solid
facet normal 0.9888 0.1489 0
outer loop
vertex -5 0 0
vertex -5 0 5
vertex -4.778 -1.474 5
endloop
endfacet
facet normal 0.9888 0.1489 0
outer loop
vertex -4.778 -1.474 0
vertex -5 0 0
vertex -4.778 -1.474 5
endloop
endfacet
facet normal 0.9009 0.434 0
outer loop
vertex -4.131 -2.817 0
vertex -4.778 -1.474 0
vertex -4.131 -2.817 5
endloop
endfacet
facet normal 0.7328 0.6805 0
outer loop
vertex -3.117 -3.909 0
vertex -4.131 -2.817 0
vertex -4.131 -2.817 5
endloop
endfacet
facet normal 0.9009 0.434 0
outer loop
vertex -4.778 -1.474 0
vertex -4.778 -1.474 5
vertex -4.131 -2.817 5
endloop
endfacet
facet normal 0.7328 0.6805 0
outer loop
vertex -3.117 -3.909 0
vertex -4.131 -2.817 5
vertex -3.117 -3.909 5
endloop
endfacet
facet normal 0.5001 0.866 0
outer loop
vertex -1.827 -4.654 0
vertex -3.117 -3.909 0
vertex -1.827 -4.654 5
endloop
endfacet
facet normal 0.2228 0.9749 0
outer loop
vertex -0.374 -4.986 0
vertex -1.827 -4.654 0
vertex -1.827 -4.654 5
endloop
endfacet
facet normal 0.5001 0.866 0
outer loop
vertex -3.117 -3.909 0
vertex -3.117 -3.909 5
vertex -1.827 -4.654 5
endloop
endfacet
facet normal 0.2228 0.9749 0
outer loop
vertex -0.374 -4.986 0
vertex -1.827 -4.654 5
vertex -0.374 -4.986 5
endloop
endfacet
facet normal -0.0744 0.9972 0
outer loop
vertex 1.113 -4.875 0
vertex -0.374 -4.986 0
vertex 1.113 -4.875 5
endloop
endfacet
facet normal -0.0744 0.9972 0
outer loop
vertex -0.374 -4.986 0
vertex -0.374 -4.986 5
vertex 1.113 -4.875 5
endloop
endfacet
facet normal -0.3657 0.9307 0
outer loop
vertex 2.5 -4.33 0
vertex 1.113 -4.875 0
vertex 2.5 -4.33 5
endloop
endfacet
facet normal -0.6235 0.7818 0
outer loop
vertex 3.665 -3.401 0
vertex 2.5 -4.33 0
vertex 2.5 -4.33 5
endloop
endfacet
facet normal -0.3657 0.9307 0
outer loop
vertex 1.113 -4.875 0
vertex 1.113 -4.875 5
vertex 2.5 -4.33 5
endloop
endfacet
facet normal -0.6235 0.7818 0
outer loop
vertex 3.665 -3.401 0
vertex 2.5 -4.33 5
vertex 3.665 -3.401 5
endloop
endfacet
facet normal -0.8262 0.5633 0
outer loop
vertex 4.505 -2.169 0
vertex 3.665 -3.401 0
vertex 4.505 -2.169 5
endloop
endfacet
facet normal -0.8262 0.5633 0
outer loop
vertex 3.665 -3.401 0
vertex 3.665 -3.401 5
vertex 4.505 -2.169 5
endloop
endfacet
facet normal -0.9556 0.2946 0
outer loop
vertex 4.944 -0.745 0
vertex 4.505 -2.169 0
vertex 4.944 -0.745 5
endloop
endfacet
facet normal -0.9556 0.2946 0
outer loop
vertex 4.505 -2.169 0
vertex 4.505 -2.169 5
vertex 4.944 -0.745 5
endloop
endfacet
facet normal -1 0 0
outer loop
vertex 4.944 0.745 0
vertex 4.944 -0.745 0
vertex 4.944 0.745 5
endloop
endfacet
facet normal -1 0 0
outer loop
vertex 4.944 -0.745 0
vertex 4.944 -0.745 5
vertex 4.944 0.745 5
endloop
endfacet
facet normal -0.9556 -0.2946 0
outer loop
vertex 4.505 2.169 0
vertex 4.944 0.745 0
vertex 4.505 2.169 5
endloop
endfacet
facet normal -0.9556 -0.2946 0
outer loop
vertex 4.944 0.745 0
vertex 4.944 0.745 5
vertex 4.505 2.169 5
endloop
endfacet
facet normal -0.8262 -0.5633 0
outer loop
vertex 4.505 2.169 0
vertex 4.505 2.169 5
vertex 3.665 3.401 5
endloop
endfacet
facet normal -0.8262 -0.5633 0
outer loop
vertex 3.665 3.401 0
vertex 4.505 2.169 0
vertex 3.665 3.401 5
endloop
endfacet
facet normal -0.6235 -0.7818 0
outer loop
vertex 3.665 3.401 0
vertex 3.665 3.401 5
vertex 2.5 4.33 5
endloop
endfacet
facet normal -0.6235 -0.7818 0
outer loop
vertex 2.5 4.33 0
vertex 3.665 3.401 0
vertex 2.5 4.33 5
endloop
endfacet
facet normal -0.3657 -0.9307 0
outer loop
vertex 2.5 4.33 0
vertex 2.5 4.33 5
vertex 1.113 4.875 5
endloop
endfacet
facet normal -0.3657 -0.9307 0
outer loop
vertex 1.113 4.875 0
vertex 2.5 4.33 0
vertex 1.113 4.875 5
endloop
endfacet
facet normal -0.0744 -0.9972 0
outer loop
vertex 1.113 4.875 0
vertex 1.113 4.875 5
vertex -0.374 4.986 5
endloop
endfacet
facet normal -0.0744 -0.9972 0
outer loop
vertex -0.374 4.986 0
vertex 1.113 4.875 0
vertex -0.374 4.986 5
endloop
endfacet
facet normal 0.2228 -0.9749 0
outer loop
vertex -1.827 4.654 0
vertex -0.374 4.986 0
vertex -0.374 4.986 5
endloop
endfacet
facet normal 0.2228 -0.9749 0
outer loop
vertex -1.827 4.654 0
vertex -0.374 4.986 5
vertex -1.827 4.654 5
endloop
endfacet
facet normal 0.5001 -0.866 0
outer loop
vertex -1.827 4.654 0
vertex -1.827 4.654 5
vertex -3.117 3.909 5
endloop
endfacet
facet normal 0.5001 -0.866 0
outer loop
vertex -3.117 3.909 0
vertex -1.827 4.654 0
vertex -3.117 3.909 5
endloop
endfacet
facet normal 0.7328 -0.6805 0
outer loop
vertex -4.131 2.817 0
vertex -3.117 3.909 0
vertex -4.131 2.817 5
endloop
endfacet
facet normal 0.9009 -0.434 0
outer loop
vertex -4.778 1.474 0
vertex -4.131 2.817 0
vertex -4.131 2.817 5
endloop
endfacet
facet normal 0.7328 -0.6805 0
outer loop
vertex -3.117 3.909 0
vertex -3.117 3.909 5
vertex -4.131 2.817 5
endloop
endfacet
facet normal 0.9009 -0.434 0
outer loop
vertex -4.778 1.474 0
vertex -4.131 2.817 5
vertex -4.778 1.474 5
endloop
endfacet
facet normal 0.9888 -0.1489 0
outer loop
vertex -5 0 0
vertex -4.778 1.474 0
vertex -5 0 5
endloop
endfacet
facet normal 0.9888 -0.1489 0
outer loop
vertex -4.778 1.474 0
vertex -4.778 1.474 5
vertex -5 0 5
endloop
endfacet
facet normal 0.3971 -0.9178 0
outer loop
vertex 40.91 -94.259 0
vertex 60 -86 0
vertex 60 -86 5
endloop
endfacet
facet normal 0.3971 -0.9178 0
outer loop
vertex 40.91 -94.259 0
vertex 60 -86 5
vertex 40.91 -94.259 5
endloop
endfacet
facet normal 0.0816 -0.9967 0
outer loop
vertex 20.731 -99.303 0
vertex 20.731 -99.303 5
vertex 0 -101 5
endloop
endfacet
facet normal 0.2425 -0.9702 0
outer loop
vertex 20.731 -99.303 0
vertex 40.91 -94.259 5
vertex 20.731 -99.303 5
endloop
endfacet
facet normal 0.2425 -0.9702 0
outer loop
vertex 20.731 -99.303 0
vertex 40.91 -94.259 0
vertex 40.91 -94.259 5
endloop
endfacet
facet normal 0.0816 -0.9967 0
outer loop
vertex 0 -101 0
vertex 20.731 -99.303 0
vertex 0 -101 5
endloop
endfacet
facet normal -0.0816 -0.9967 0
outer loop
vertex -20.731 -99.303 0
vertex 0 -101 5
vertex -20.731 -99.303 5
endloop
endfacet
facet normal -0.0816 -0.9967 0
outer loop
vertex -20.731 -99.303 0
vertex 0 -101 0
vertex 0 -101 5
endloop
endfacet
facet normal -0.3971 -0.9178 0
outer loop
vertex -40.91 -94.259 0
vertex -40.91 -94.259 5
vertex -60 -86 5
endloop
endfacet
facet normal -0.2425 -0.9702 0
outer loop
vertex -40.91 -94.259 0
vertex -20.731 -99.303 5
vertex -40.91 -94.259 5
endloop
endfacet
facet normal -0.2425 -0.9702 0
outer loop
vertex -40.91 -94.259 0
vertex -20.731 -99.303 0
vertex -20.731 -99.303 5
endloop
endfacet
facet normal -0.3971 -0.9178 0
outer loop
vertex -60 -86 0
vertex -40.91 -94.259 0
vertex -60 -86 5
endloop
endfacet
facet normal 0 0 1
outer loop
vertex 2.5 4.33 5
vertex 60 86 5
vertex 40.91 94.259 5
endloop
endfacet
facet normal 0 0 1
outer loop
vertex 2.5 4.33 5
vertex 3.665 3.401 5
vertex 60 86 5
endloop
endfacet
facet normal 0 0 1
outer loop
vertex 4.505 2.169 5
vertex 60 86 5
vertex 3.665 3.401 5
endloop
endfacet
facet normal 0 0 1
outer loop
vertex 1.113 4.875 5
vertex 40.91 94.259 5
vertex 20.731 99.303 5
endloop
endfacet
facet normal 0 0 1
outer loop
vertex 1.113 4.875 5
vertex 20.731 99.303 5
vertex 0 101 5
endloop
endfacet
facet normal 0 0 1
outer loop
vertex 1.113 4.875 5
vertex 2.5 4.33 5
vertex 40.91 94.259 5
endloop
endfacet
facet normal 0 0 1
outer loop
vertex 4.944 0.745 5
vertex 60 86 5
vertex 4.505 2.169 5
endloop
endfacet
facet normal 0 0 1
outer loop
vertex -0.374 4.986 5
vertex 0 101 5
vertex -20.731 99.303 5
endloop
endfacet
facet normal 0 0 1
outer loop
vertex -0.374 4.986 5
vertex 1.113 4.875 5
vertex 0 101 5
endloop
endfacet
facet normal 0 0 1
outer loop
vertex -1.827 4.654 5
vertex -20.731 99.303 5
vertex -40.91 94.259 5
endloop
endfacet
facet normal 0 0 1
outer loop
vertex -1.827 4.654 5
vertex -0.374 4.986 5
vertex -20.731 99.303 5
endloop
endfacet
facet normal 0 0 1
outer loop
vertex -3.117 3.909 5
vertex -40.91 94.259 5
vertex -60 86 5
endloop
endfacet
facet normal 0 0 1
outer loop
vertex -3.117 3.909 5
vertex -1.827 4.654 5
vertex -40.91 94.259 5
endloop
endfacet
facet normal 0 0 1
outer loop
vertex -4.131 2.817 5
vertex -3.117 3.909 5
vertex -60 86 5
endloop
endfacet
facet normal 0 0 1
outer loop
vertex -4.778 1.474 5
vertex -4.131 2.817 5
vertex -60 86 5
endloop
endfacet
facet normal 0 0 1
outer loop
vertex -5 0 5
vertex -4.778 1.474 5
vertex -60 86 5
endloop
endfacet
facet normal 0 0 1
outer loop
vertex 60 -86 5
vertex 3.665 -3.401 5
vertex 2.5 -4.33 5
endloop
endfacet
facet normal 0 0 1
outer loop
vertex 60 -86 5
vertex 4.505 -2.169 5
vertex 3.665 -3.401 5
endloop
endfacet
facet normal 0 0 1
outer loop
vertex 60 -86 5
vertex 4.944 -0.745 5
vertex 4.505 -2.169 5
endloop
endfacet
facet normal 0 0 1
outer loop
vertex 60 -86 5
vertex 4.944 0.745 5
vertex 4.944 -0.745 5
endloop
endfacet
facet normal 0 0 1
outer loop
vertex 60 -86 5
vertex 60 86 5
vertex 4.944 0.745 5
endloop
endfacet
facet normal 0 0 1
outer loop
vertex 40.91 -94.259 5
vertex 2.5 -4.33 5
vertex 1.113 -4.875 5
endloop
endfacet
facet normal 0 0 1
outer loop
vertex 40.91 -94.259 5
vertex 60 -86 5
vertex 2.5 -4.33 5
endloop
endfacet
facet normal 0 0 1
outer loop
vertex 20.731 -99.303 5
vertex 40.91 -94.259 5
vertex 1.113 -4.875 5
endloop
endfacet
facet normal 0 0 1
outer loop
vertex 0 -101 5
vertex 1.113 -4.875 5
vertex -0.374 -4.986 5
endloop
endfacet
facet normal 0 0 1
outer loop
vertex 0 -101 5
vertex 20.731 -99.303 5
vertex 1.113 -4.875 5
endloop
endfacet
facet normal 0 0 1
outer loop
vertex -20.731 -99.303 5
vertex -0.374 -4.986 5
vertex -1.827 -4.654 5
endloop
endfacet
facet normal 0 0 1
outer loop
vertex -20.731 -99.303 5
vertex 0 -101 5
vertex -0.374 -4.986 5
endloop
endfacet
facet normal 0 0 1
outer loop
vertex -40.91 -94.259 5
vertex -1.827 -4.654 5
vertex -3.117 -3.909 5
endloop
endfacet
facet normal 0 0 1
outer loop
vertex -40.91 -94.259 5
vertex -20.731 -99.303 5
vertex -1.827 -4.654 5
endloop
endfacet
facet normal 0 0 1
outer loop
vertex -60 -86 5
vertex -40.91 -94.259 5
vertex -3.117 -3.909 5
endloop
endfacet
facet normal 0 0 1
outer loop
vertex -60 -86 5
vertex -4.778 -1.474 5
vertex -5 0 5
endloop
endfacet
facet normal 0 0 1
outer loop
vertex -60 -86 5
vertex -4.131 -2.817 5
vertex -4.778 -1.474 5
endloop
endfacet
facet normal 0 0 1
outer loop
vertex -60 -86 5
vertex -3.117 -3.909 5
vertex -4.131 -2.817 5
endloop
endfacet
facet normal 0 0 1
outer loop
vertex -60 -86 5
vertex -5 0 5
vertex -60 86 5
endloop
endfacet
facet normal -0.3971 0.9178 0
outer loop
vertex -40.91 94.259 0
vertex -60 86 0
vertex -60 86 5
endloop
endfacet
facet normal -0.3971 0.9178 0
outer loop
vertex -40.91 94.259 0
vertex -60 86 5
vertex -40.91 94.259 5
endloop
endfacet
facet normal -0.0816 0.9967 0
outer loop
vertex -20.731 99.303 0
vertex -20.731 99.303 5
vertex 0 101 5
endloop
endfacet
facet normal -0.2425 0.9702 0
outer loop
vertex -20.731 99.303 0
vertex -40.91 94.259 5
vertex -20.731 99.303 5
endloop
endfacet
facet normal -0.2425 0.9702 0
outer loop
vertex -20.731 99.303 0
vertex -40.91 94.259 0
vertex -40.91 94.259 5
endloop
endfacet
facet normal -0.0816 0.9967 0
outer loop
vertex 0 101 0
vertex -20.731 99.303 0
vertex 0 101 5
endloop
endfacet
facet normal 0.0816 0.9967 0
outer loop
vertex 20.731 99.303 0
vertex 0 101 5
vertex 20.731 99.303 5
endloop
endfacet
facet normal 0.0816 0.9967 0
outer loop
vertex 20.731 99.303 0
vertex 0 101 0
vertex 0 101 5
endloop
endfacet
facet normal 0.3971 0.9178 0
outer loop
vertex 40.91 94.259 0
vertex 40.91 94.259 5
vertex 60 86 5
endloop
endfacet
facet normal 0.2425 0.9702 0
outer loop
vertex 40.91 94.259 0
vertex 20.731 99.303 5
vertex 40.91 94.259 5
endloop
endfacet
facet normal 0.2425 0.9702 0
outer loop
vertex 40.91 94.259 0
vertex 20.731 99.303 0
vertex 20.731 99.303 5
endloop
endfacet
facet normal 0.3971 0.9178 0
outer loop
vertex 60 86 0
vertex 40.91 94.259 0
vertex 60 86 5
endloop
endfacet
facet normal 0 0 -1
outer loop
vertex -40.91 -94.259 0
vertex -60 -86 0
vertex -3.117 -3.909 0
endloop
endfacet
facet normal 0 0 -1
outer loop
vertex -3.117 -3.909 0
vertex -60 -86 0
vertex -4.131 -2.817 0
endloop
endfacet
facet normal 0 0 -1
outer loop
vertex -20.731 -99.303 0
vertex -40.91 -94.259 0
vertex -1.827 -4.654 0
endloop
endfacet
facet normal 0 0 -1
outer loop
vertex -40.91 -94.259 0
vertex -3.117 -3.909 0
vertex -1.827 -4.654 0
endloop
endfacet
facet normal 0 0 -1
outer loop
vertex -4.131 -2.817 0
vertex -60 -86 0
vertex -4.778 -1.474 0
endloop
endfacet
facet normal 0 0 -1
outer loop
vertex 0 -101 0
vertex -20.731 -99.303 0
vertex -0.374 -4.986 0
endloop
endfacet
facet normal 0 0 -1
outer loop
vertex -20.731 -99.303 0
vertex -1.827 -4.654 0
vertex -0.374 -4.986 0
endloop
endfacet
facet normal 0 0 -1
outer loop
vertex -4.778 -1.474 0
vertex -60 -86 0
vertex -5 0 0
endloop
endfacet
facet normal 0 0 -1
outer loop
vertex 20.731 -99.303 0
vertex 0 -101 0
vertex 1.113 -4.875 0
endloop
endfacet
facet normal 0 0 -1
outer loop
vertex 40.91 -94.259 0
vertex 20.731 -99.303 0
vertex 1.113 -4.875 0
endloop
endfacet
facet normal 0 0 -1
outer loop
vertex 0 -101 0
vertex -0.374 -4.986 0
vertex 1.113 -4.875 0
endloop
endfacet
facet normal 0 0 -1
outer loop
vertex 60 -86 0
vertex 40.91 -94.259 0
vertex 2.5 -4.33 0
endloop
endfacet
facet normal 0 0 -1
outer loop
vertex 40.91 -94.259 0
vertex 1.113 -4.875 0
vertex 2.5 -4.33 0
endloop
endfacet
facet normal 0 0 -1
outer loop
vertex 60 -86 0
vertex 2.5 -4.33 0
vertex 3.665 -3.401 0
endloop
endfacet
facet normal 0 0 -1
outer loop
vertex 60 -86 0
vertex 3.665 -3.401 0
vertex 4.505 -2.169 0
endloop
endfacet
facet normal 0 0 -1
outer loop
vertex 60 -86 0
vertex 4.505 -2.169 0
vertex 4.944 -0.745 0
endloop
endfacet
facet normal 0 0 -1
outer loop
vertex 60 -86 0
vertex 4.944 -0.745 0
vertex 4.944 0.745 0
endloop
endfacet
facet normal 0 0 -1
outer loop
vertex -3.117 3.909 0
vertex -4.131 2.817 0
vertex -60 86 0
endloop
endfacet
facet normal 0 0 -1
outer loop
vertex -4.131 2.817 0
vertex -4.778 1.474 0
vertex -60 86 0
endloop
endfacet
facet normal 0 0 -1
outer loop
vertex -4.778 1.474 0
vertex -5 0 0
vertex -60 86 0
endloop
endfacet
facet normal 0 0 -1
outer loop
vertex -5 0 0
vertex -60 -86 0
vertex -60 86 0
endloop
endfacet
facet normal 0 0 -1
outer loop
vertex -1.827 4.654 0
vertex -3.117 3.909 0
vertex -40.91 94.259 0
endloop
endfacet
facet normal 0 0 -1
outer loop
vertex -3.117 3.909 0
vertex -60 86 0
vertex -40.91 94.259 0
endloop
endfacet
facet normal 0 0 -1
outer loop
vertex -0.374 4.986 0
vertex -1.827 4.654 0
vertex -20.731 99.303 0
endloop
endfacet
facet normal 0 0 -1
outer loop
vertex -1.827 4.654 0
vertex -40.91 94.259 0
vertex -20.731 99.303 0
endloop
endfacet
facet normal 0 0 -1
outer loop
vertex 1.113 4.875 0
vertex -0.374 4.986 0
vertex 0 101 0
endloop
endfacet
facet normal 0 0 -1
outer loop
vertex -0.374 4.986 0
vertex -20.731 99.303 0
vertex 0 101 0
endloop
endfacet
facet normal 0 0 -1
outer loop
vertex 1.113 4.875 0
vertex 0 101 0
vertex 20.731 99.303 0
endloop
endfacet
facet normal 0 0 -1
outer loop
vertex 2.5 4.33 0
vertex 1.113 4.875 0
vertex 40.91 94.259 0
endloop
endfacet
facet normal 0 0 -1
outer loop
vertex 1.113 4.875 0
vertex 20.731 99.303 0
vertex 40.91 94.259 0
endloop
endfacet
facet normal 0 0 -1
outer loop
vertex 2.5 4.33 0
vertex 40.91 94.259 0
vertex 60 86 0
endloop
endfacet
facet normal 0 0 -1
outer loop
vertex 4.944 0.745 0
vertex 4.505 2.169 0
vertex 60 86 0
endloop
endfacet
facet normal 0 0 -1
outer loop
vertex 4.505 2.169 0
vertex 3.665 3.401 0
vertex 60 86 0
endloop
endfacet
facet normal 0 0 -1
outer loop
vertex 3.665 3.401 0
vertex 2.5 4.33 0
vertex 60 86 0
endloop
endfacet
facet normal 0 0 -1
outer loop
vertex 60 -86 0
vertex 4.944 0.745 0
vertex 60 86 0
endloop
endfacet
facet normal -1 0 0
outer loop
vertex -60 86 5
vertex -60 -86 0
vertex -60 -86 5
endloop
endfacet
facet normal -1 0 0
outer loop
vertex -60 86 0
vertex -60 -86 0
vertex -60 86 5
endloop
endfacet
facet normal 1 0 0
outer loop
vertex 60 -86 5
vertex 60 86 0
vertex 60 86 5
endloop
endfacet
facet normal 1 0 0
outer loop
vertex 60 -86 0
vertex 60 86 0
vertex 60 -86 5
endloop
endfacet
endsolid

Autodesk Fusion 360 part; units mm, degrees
sketch "Esquisse1" plane through (0, 0, 0) normal (0, 0, 1) x (1, 0, 0)
  line L0 (60, -86) -> (-60, -86)
  line L1 (-60, -86) -> (-60, 86)
  line L2 (-60, 86) -> (60, 86)
  line L3 (60, 86) -> (60, -86)
  line L4 (60, -86) -> (-60, 86) construction
  line L5 (-60, -86) -> (60, 86) construction
  dimension "d1" = 120
  dimension "d2" = 172
sketch "Esquisse2" plane through (0, 0, 0) normal (0, 0, 1) x (1, 0, 0)
  line L0 (0, -86) -> (0, -101)
  line L1 (0, 86) -> (0, 101)
  line L2 (60, -86) -> (-60, -86)
  line L3 (-60, -86) -> (-60, -116)
  line L4 (-60, -116) -> (60, -116)
  line L5 (60, -116) -> (60, -86)
  line L6 (60, -86) -> (-60, -116) construction
  line L7 (-60, -86) -> (60, -116) construction
  line L8 (-60, 86) -> (60, 86)
  line L9 (60, 86) -> (60, 116)
  line L10 (60, 116) -> (-60, 116)
  line L11 (-60, 116) -> (-60, 86)
  line L12 (-60, 86) -> (60, 116) construction
  line L13 (60, 86) -> (-60, 116) construction
  arc A0 (60, 86) -> (-60, 86) centre (0, -26.5) ccw
  arc A1 (-60, -86) -> (60, -86) centre (0, 26.5) ccw
  point P0 (0, -101)
  point P1 (0, 101)
  dimension "d3" = 15
  dimension "d4" = 15
extrude "Extrusion1" add sketch "Esquisse1" sketch "Esquisse2" along normal blind 10 of sketch 2 contours L0 L2 A1 | L0 L2 A1 | L1 L8 A0 | L1 L8 A0
sketch "Esquisse3" plane through (0, 0, 10) normal (0, 0, 1) x (-1, 0, 0)
  line L0 (60, -86) -> (60, 86)
  arc A0 (60, 86) -> (-60, 86) centre (0, -26.5) ccw
  line L1 (-60, 86) -> (-60, -86)
  arc A1 (-60, -86) -> (60, -86) centre (0, 26.5) ccw
  line L2 (60, 86) -> (-60, 86)
  line L3 (60, -86) -> (-60, -86)
  line L4 (-60, 86) -> (-60, 70)
  line L5 (-60, 70) -> (-60, 48)
  line L6 (-60, 48) -> (-60, -48)
  line L7 (-60, -48) -> (-60, -70)
  line L8 (60, 86) -> (60, 70)
  line L9 (60, 70) -> (60, 48)
  line L10 (60, 48) -> (60, -48)
  line L11 (60, -48) -> (60, -70)
  line L12 (60, 70) -> (36, 70)
  line L13 (36, 70) -> (36, 48)
  line L14 (36, 48) -> (60, 48)
  line L15 (60, -70) -> (36, -70)
  line L16 (36, -70) -> (36, -48)
  line L17 (36, -48) -> (60, -48)
  line L18 (-60, -70) -> (-36, -70)
  line L19 (-36, -70) -> (-36, -48)
  line L20 (-36, -48) -> (-60, -48)
  line L21 (-60, 70) -> (-36, 70)
  line L22 (-36, 70) -> (-36, 48)
  line L23 (-60, 48) -> (-36, 48)
  dimension "d7" = 16
  dimension "d8" = 22
  dimension "d9" = 96
  dimension "d10" = 22
  dimension "d11" = 16
  dimension "d12" = 22
  dimension "d13" = 96
  dimension "d14" = 22
  dimension "d15" = 24
  dimension "d16" = 24
  dimension "d17" = 22
sketch "Esquisse4" plane through (0, 0, 10) normal (0, 0, 1) x (-1, 0, 0)
  line L0 (-60, -86) -> (-17, -86)
  line L1 (-17, -86) -> (17, -86)
  line L2 (17, -86) -> (17, -70)
  line L3 (17, -70) -> (-17, -70)
  line L4 (-17, -70) -> (-17, -86)
  dimension "d18" = 43
  dimension "d19" = 34
extrude "Extrusion2" cut sketch "Esquisse3" against normal blind 5
extrude "Extrusion3" cut sketch "Esquisse4" along normal blind 0 and the other way blind 25
sketch "Esquisse5" plane through (0, 0, 5) normal (0, 0, 1) x (-1, 0, 0)
  line L0 (17, -86) -> (-17, -86)
  line L1 (-17, -86) -> (-17, -70)
  line L2 (-17, -70) -> (17, -70)
  line L3 (17, -70) -> (17, -86)
  arc A0 (60, 86) -> (-60, 86) centre (0, -26.5) ccw
  line L4 (-60, 86) -> (-60, -86)
  arc A1 (-60, -86) -> (60, -86) centre (0, 26.5) ccw
  line L5 (60, -86) -> (60, 86)
  line L6 (-60, -86) -> (60, -86)
  line L7 (-60, 86) -> (60, 86)
  line L8 (-60, -86) -> (-60, -70)
  line L9 (-60, -70) -> (-60, -48)
  line L10 (-60, -48) -> (-60, 48)
  line L11 (-60, 48) -> (-60, 70)
  line L12 (-60, -70) -> (-36, -70)
  line L13 (-36, -70) -> (-36, -48)
  line L14 (-36, -48) -> (-60, -48)
  line L15 (-60, 70) -> (-36, 70)
  line L16 (-60, 48) -> (-36, 48)
  line L17 (-36, 48) -> (-36, 70)
  line L18 (60, -70) -> (36, -70)
  line L19 (36, -70) -> (36, -48)
  line L20 (36, -48) -> (60, -48)
  line L21 (60, 48) -> (36, 48)
  line L22 (36, 48) -> (36, 70)
  line L23 (36, 70) -> (60, 70)
  dimension "d27" = 16
  dimension "d28" = 22
  dimension "d29" = 96
  dimension "d30" = 22
  dimension "d31" = 24
  dimension "d32" = 24
sketch "Esquisse6" plane through (0, 0, 5) normal (0, 0, 1) x (-1, 0, 0)
  line L0 (27.5, -60) -> (-27.5, -60)
  line L1 (-27.5, -60) -> (-27.5, 7)
  line L2 (-27.5, 7) -> (27.5, 7)
  line L3 (27.5, 7) -> (27.5, -60)
  dimension "d34" = 55
  dimension "d35" = 67
sketch "Esquisse7" plane through (0, 0, 5) normal (0, 0, 1) x (-1, 0, 0)
  line L0 (27.5, 17) -> (-27.5, 17)
  line L1 (-27.5, 17) -> (-27.5, 83)
  line L2 (-27.5, 83) -> (27.5, 83)
  line L3 (27.5, 83) -> (27.5, 17)
  dimension "d38" = 55
  dimension "d39" = 66
extrude "Extrusion4" add sketch "Esquisse5" against normal blind 5 contours L0 L1 L2 L3 L6
sketch "Esquisse8" plane through (0, 0, 5) normal (0, 0, 1) x (-1, 0, 0)
  arc A0 (60, 86) -> (-60, 86) centre (0, -26.5) ccw
  line L0 (-60, 86) -> (-60, -86)
  arc A1 (-60, -86) -> (60, -86) centre (0, 26.5) ccw
  line L1 (60, -86) -> (60, 86)
  circle A2 centre (0, 0) radius 5
  dimension "d42" = 10
extrude "Extrusion5" cut sketch "Esquisse8" against normal blind 5 contours A2
sketch "Esquisse9" plane through (0, 0, 5) normal (0, 0, 1) x (-1, 0, 0)
  circle A0 centre (0, 0) radius 5
  arc A1 (60, 86) -> (-60, 86) centre (0, -26.5) ccw
  line L0 (-60, 86) -> (-60, -86)
  arc A2 (-60, -86) -> (60, -86) centre (0, 26.5) ccw
  line L1 (60, -86) -> (60, 86)
  line L2 (60, 86) -> (-60, 86)
  line L3 (60, -86) -> (-60, -86)
